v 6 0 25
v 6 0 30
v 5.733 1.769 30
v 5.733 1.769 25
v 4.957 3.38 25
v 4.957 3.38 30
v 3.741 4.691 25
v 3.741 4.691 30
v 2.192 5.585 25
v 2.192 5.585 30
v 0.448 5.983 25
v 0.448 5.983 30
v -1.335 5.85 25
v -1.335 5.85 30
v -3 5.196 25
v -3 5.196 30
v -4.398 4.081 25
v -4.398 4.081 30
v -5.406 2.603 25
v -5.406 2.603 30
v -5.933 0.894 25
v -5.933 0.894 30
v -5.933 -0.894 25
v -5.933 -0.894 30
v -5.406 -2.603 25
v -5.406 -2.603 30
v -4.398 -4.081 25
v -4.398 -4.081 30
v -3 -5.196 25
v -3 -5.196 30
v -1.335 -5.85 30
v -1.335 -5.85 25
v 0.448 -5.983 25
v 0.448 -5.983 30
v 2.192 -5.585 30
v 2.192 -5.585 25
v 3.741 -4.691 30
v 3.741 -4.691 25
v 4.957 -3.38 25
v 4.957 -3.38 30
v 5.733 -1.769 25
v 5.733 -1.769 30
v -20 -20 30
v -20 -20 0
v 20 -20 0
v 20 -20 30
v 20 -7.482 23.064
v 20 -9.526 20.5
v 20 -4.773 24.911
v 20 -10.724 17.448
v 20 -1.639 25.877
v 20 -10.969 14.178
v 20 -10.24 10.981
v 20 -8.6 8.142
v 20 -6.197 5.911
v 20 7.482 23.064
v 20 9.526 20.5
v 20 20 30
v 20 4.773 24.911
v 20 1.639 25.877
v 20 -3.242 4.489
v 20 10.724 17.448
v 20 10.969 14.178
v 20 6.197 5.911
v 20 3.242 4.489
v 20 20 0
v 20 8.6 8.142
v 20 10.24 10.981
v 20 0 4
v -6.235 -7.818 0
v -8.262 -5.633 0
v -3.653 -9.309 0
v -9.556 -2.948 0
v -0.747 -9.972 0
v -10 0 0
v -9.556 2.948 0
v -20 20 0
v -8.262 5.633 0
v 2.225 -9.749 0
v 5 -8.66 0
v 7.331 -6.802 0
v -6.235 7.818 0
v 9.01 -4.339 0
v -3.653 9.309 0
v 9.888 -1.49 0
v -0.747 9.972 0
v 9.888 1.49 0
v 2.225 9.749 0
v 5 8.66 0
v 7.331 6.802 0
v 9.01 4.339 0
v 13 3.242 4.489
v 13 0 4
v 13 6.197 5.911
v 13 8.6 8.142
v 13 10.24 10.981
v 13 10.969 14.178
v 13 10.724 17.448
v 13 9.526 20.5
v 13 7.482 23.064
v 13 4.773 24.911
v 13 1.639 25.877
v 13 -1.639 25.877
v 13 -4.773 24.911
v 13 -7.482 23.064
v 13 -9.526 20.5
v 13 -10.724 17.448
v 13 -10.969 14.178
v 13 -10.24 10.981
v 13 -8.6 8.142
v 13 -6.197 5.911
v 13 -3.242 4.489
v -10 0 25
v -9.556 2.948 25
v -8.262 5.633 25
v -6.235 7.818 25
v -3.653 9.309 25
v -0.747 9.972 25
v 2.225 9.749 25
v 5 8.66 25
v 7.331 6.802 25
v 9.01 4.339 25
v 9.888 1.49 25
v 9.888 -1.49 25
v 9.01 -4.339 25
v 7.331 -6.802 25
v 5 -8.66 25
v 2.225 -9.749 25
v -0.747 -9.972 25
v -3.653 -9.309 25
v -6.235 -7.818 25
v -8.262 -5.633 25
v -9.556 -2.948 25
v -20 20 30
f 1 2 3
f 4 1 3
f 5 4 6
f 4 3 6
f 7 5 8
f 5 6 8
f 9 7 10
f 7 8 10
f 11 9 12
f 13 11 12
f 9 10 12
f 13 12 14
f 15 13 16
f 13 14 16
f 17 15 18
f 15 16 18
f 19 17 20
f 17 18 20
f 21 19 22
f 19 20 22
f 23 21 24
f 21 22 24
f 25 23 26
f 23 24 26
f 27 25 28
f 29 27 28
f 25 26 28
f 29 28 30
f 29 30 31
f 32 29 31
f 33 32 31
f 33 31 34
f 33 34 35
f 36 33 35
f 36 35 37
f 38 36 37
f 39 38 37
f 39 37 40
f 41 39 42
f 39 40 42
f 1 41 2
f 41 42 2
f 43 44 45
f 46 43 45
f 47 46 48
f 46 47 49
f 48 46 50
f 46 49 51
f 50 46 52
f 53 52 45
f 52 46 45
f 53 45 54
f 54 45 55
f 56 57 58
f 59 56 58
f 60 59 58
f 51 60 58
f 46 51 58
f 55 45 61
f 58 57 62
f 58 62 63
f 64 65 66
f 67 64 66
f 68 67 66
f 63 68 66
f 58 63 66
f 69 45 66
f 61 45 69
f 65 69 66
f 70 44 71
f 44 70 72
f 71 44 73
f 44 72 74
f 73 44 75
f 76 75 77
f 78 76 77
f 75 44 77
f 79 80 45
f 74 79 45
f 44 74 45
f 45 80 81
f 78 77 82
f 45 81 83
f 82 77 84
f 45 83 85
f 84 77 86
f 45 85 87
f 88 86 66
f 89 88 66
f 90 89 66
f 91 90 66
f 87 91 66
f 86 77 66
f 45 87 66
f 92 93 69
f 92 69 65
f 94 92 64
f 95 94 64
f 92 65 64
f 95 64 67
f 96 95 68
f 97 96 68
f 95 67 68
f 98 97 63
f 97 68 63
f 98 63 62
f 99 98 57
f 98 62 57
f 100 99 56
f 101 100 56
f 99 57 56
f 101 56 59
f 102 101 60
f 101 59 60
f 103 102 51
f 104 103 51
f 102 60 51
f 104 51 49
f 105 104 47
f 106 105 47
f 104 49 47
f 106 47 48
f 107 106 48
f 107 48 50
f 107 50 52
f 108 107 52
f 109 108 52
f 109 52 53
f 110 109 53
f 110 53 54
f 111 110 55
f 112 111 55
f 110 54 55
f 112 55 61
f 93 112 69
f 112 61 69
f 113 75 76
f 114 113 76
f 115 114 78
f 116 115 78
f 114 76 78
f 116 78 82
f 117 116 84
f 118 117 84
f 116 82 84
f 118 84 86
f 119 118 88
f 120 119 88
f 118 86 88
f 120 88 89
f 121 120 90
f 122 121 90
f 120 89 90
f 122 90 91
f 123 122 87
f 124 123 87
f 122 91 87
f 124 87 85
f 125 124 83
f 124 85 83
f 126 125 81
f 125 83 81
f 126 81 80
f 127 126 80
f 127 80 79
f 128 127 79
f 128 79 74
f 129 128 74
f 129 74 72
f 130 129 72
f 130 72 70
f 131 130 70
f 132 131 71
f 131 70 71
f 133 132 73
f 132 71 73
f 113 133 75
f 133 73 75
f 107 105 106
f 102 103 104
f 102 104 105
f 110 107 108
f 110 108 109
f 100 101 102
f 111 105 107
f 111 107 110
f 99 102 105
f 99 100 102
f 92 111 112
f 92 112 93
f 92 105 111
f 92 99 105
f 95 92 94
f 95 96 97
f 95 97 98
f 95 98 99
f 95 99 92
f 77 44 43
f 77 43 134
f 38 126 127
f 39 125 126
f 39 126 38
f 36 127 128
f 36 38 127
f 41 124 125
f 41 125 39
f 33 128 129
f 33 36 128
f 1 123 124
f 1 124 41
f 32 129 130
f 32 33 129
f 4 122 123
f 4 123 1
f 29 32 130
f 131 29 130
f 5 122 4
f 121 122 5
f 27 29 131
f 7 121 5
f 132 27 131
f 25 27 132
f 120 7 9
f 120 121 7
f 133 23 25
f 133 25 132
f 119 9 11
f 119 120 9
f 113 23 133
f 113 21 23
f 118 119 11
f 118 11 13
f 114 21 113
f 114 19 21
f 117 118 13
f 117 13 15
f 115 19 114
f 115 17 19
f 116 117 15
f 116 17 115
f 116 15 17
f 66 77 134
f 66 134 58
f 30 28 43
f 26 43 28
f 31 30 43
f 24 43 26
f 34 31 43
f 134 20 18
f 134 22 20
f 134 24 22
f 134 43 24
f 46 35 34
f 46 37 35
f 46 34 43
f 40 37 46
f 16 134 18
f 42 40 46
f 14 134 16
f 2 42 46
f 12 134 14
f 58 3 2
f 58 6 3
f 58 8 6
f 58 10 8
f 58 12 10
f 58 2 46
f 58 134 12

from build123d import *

# Parameters (mm, degrees)
SKETCH2_W           = 40
SKETCH2_H           = 40
BOSS_EXTRUDE1_DEPTH = 30
SKETCH6_W           = 26
SKETCH6_H           = 26
BOSS_EXTRUDE2_DEPTH = 40
SKETCH7_R           = 11
CUT_EXTRUDE3_DEPTH  = 7
SKETCH3_R           = 6
CUT_EXTRUDE4_DEPTH  = 5
SKETCH4_R           = 10
CUT_EXTRUDE5_DEPTH  = 25


with BuildPart() as part:
    # Sketch2 → Boss-Extrude1 (new body)
    with BuildSketch(Plane.XY):
        Rectangle(SKETCH2_W, SKETCH2_H)
    extrude(amount=BOSS_EXTRUDE1_DEPTH)

    # Sketch6 → Boss-Extrude2 (add)
    with BuildSketch(Plane(origin=(20, 0, 0), x_dir=(0, 0, -1), z_dir=(1, 0, 0))):
        with Locations((-15, 0)):
            Rectangle(SKETCH6_W, SKETCH6_H)
    extrude(amount=-BOSS_EXTRUDE2_DEPTH)

    # Sketch7 → Cut-Extrude3 (cut)
    with BuildSketch(Plane(origin=(20, 0, 0), x_dir=(0, 0, -1), z_dir=(1, 0, 0))):
        with Locations((-15, 0)):
            Circle(SKETCH7_R)
    extrude(amount=-CUT_EXTRUDE3_DEPTH, mode=Mode.SUBTRACT)

    # Sketch3 → Cut-Extrude4 (cut)
    with BuildSketch(Plane.XY.offset(30)):
        Circle(SKETCH3_R)
    extrude(amount=-CUT_EXTRUDE4_DEPTH, mode=Mode.SUBTRACT)

    # Sketch4 → Cut-Extrude5 (cut)
    with BuildSketch(Plane(origin=(0, 0, 0), x_dir=(-1, 0, 0), z_dir=(0, 0, -1))):
        Circle(SKETCH4_R)
    extrude(amount=-CUT_EXTRUDE5_DEPTH, mode=Mode.SUBTRACT)


solid = part.part
